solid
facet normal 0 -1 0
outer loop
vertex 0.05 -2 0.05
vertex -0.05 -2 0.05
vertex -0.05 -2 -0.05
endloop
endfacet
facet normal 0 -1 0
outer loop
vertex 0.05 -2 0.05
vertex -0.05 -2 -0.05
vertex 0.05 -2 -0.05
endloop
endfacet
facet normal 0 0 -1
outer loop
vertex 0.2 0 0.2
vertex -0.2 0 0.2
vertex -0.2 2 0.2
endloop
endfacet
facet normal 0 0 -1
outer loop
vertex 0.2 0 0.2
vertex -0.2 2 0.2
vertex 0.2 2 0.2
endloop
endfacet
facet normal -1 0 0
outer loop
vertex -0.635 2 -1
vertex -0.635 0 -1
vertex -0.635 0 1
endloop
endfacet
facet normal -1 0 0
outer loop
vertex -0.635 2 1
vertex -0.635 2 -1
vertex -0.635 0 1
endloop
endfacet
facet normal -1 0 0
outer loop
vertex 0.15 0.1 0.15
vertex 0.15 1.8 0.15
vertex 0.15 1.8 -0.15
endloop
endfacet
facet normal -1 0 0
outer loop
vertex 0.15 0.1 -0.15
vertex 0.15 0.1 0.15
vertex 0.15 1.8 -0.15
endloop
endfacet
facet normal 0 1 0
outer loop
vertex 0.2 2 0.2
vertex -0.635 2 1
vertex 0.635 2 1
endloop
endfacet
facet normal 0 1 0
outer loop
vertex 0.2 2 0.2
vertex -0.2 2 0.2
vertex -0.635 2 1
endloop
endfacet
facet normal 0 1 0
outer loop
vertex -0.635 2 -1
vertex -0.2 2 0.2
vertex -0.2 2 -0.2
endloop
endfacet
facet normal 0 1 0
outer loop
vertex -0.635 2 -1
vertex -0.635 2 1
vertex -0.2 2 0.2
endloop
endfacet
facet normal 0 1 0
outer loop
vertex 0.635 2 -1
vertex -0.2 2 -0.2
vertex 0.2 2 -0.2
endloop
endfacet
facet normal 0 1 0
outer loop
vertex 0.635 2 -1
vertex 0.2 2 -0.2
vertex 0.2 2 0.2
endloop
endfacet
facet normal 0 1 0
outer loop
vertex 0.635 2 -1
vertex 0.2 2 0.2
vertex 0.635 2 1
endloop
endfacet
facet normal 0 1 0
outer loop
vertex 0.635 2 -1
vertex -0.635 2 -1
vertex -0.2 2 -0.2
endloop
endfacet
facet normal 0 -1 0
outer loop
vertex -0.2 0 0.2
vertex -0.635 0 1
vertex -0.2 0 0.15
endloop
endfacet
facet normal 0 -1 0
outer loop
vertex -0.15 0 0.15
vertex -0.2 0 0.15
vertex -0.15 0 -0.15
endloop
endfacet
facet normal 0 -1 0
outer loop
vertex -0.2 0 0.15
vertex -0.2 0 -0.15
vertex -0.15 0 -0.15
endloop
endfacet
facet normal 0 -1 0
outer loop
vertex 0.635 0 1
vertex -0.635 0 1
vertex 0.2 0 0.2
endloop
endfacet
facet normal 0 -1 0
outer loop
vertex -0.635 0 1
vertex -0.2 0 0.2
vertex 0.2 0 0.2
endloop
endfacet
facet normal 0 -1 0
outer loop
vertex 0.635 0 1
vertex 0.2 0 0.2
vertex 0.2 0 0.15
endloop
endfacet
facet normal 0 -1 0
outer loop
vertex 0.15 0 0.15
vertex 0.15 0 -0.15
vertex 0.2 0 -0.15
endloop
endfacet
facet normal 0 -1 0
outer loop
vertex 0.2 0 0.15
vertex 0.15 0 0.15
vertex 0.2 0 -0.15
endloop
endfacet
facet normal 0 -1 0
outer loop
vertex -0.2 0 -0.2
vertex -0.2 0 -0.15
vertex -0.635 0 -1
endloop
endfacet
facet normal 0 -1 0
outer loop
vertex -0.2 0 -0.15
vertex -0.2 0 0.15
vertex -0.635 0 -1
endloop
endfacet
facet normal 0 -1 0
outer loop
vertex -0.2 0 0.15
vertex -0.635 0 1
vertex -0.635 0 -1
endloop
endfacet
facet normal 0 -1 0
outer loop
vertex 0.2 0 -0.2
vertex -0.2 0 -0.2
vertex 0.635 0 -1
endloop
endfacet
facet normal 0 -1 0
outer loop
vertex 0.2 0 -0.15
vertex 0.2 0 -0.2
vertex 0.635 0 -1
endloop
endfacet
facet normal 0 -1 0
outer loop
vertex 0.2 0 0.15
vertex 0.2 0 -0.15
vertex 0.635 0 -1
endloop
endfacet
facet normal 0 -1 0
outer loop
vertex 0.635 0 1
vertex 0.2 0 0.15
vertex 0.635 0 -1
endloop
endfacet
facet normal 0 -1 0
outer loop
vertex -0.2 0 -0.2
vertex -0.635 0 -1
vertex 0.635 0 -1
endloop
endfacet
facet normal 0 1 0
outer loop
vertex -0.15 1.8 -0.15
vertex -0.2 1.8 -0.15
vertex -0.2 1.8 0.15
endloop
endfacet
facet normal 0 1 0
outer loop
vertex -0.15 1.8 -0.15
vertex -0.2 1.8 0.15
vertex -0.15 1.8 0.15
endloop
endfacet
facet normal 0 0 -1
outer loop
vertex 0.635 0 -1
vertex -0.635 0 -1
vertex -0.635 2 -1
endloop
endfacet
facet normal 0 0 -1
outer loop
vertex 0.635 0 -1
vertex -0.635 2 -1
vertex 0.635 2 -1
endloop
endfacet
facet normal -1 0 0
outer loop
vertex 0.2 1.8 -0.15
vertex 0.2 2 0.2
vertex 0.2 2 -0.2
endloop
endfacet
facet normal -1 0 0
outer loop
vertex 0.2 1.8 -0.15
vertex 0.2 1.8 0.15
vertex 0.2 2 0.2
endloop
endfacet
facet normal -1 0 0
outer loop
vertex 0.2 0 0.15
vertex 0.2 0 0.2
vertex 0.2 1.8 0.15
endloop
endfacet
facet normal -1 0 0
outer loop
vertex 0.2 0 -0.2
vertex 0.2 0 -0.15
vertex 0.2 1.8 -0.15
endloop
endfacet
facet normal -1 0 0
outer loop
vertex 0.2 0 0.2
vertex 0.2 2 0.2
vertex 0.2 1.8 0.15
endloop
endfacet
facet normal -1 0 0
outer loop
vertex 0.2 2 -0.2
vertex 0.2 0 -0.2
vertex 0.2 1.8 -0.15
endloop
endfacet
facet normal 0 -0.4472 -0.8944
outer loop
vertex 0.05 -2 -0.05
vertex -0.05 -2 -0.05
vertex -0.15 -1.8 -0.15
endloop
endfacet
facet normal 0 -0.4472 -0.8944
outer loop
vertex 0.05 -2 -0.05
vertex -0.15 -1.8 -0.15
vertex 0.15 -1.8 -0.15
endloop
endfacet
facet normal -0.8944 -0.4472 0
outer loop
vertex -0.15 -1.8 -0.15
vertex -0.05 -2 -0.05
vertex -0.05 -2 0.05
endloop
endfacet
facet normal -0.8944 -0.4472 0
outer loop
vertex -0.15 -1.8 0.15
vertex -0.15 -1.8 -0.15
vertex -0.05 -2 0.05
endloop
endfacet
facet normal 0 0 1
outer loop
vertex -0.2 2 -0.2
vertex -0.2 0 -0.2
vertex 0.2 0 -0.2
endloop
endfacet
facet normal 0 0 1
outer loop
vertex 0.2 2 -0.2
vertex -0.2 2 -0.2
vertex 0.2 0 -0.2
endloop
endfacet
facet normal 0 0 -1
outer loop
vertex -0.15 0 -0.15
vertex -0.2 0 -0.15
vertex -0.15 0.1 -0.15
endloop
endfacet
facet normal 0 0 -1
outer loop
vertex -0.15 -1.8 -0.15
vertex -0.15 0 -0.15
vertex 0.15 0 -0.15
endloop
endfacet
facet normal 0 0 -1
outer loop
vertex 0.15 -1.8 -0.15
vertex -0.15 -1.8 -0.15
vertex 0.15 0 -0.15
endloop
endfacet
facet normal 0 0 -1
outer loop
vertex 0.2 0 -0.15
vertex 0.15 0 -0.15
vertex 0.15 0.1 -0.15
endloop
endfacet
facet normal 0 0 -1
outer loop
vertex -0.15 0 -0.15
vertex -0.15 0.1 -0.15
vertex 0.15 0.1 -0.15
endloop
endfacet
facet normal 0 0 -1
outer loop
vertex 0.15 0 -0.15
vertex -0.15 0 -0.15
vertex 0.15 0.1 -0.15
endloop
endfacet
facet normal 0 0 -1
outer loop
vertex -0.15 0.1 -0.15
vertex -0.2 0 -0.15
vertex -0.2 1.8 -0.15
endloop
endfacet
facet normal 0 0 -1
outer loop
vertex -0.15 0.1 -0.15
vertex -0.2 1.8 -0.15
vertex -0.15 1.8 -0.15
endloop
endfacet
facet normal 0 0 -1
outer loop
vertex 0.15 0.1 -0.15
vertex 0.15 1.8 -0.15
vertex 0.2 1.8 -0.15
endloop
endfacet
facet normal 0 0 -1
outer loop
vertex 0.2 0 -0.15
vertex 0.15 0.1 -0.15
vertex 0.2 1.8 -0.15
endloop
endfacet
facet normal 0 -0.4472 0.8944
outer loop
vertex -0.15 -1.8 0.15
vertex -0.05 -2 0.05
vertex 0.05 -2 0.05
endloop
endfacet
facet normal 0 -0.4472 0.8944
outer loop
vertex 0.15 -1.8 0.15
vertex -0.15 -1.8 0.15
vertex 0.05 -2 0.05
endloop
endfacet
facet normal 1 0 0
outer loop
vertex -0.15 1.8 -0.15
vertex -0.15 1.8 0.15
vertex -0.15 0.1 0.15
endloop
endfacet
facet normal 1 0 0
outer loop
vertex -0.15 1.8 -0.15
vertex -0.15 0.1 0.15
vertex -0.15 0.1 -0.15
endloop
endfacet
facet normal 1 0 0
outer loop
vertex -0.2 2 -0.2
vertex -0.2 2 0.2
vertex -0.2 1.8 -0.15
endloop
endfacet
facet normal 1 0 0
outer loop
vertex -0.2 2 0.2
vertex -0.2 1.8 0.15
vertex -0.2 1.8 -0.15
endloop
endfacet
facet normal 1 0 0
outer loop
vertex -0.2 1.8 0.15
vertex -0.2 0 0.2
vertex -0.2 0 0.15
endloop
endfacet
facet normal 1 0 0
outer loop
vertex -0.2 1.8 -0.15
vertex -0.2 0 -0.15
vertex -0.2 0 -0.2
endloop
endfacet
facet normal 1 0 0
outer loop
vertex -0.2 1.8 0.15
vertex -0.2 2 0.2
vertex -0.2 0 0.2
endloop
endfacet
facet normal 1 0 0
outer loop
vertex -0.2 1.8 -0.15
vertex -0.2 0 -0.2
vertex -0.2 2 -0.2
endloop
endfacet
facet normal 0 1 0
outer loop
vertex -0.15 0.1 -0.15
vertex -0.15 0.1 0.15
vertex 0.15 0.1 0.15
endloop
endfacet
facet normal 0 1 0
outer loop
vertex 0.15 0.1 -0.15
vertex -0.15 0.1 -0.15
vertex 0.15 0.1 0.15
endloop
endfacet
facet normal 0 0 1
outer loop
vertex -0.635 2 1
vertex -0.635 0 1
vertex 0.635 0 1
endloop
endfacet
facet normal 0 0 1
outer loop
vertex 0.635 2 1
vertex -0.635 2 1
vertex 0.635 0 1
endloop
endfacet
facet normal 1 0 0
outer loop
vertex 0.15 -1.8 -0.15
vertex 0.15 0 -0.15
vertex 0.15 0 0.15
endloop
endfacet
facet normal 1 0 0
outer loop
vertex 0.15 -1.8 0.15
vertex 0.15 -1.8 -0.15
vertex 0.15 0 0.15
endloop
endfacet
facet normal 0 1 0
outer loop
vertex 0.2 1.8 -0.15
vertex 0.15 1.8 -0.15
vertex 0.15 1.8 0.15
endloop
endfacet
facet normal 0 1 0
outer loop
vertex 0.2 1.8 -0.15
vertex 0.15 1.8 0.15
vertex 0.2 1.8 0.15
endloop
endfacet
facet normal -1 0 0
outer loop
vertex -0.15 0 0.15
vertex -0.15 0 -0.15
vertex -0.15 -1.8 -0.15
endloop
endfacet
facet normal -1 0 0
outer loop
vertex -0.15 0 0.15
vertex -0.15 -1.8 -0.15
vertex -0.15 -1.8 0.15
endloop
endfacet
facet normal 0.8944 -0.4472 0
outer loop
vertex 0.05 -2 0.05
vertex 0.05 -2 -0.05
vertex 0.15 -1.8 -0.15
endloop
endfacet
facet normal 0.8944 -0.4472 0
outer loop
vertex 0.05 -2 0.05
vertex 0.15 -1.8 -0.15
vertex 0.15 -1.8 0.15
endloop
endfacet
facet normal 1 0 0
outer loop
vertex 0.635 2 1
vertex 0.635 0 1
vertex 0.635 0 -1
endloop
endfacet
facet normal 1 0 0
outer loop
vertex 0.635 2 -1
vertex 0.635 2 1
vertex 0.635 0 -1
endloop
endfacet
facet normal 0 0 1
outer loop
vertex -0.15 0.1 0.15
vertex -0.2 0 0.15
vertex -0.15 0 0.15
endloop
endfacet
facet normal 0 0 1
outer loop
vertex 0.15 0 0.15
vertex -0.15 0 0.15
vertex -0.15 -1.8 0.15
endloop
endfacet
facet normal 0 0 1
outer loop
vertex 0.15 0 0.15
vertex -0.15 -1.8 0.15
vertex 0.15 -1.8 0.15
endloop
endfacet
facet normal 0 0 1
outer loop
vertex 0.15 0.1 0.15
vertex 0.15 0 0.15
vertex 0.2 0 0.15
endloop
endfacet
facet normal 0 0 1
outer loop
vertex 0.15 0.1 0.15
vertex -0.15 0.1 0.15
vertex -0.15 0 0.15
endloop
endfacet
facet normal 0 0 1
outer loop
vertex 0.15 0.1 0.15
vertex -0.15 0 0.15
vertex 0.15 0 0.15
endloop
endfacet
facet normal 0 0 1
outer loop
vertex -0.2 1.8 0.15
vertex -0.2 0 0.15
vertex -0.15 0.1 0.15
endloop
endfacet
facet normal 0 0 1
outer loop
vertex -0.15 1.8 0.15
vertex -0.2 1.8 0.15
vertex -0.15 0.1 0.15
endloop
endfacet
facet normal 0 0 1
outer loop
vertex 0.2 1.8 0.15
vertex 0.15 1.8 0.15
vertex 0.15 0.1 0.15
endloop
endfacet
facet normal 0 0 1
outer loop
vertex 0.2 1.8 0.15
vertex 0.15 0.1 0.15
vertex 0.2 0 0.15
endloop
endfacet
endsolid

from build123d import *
from OCP.BRepFilletAPI import BRepFilletAPI_MakeChamfer

# Parameters (mm, degrees)
SKETCH_1_W        = 1.27
SKETCH_1_H        = 2
SKETCH_1_W_2      = 0.4
SKETCH_1_H_2      = 0.4
EXTRUDE_1_DEPTH   = 2
SKETCH_3_W        = 0.2
SKETCH_3_H        = 0.3
EXTRUDE_2_DEPTH   = 1.8
EXTRUDE_2_2_DEPTH = 1.8
SKETCH_5_W        = 1.27
SKETCH_5_H        = 0.3
EXTRUDE_3_DEPTH   = 0.1
SKETCH_6_W        = 0.3
SKETCH_6_H        = 0.3
EXTRUDE_4_DEPTH   = 2
CHAMFER_1_SIZE    = 0.2
CHAMFER_1_SIZE2   = 0.1


with BuildPart() as part:
    # Sketch 1 → Extrude 1 (new body)
    with BuildSketch(Plane(origin=(0, 0, 0), x_dir=(1, 0, 0), z_dir=(0, 1, 0))):
        Rectangle(SKETCH_1_W, SKETCH_1_H)
        Rectangle(SKETCH_1_W_2, SKETCH_1_H_2, mode=Mode.SUBTRACT)
    extrude(amount=EXTRUDE_1_DEPTH)



with BuildPart() as body_2:
    # Sketch 3 → Extrude 2 (new body)
    with BuildSketch(Plane(origin=(0, 1.8, 0), x_dir=(1, 0, 0), z_dir=(0, 1, 0))):
        with Locations((0.25, 0)):
            Rectangle(SKETCH_3_W, SKETCH_3_H)
    extrude(amount=-EXTRUDE_2_DEPTH)


with BuildPart() as body_3:
    # Sketch 3 → Extrude 2 2 (new body)
    with BuildSketch(Plane(origin=(0, 1.8, 0), x_dir=(1, 0, 0), z_dir=(0, 1, 0))):
        with Locations((-0.25, 0)):
            Rectangle(SKETCH_3_W, SKETCH_3_H)
    extrude(amount=-EXTRUDE_2_2_DEPTH)


with BuildPart() as part_1:
    add(part.part)

    add(body_2.part)  # Extrude 3 merges body 2

    add(body_3.part)  # Extrude 3 merges body 3
    # Sketch 5 → Extrude 3 (add)
    with BuildSketch(Plane.XZ):
        Rectangle(SKETCH_5_W, SKETCH_5_H)
    extrude(amount=-EXTRUDE_3_DEPTH)

    # Sketch 6 → Extrude 4 (add)
    with BuildSketch(Plane.XZ):
        Rectangle(SKETCH_6_W, SKETCH_6_H)
    extrude(amount=EXTRUDE_4_DEPTH)

    # Chamfer 1: one chamfer whose edges measure the first distance from different faces: ONE call of the kernel's chamfer builder (chamfer() names one face for all edges)
    chamfer_1_edges_1 = [part_1.edges().sort_by_distance(p)[0] for p in [
        (-0.15, -2, 0),
    ]]
    chamfer_1_side_1 = [part_1.faces().sort_by_distance(p)[0] for p in [
        (-0.15, -1, 0),
    ]]
    chamfer_1_edges_2 = [part_1.edges().sort_by_distance(p)[0] for p in [
        (0, -2, -0.15),
    ]]
    chamfer_1_side_2 = [part_1.faces().sort_by_distance(p)[0] for p in [
        (0, -0.538888889, -0.15),
    ]]
    chamfer_1_edges_3 = [part_1.edges().sort_by_distance(p)[0] for p in [
        (0.15, -2, 0),
    ]]
    chamfer_1_side_3 = [part_1.faces().sort_by_distance(p)[0] for p in [
        (0.15, -1, 0),
    ]]
    chamfer_1_edges_4 = [part_1.edges().sort_by_distance(p)[0] for p in [
        (0, -2, 0.15),
    ]]
    chamfer_1_side_4 = [part_1.faces().sort_by_distance(p)[0] for p in [
        (0, -0.538888889, 0.15),
    ]]
    chamfer_1 = BRepFilletAPI_MakeChamfer(part_1.part.solid().wrapped)
    for e in chamfer_1_edges_1:
        chamfer_1.Add(CHAMFER_1_SIZE, CHAMFER_1_SIZE2, e.wrapped, chamfer_1_side_1[0].wrapped)  # the first distance lies on this face
    for e in chamfer_1_edges_2:
        chamfer_1.Add(CHAMFER_1_SIZE, CHAMFER_1_SIZE2, e.wrapped, chamfer_1_side_2[0].wrapped)  # the first distance lies on this face
    for e in chamfer_1_edges_3:
        chamfer_1.Add(CHAMFER_1_SIZE, CHAMFER_1_SIZE2, e.wrapped, chamfer_1_side_3[0].wrapped)  # the first distance lies on this face
    for e in chamfer_1_edges_4:
        chamfer_1.Add(CHAMFER_1_SIZE, CHAMFER_1_SIZE2, e.wrapped, chamfer_1_side_4[0].wrapped)  # the first distance lies on this face
    add(Compound.cast(chamfer_1.Shape()), mode=Mode.REPLACE)


solid = part_1.part
